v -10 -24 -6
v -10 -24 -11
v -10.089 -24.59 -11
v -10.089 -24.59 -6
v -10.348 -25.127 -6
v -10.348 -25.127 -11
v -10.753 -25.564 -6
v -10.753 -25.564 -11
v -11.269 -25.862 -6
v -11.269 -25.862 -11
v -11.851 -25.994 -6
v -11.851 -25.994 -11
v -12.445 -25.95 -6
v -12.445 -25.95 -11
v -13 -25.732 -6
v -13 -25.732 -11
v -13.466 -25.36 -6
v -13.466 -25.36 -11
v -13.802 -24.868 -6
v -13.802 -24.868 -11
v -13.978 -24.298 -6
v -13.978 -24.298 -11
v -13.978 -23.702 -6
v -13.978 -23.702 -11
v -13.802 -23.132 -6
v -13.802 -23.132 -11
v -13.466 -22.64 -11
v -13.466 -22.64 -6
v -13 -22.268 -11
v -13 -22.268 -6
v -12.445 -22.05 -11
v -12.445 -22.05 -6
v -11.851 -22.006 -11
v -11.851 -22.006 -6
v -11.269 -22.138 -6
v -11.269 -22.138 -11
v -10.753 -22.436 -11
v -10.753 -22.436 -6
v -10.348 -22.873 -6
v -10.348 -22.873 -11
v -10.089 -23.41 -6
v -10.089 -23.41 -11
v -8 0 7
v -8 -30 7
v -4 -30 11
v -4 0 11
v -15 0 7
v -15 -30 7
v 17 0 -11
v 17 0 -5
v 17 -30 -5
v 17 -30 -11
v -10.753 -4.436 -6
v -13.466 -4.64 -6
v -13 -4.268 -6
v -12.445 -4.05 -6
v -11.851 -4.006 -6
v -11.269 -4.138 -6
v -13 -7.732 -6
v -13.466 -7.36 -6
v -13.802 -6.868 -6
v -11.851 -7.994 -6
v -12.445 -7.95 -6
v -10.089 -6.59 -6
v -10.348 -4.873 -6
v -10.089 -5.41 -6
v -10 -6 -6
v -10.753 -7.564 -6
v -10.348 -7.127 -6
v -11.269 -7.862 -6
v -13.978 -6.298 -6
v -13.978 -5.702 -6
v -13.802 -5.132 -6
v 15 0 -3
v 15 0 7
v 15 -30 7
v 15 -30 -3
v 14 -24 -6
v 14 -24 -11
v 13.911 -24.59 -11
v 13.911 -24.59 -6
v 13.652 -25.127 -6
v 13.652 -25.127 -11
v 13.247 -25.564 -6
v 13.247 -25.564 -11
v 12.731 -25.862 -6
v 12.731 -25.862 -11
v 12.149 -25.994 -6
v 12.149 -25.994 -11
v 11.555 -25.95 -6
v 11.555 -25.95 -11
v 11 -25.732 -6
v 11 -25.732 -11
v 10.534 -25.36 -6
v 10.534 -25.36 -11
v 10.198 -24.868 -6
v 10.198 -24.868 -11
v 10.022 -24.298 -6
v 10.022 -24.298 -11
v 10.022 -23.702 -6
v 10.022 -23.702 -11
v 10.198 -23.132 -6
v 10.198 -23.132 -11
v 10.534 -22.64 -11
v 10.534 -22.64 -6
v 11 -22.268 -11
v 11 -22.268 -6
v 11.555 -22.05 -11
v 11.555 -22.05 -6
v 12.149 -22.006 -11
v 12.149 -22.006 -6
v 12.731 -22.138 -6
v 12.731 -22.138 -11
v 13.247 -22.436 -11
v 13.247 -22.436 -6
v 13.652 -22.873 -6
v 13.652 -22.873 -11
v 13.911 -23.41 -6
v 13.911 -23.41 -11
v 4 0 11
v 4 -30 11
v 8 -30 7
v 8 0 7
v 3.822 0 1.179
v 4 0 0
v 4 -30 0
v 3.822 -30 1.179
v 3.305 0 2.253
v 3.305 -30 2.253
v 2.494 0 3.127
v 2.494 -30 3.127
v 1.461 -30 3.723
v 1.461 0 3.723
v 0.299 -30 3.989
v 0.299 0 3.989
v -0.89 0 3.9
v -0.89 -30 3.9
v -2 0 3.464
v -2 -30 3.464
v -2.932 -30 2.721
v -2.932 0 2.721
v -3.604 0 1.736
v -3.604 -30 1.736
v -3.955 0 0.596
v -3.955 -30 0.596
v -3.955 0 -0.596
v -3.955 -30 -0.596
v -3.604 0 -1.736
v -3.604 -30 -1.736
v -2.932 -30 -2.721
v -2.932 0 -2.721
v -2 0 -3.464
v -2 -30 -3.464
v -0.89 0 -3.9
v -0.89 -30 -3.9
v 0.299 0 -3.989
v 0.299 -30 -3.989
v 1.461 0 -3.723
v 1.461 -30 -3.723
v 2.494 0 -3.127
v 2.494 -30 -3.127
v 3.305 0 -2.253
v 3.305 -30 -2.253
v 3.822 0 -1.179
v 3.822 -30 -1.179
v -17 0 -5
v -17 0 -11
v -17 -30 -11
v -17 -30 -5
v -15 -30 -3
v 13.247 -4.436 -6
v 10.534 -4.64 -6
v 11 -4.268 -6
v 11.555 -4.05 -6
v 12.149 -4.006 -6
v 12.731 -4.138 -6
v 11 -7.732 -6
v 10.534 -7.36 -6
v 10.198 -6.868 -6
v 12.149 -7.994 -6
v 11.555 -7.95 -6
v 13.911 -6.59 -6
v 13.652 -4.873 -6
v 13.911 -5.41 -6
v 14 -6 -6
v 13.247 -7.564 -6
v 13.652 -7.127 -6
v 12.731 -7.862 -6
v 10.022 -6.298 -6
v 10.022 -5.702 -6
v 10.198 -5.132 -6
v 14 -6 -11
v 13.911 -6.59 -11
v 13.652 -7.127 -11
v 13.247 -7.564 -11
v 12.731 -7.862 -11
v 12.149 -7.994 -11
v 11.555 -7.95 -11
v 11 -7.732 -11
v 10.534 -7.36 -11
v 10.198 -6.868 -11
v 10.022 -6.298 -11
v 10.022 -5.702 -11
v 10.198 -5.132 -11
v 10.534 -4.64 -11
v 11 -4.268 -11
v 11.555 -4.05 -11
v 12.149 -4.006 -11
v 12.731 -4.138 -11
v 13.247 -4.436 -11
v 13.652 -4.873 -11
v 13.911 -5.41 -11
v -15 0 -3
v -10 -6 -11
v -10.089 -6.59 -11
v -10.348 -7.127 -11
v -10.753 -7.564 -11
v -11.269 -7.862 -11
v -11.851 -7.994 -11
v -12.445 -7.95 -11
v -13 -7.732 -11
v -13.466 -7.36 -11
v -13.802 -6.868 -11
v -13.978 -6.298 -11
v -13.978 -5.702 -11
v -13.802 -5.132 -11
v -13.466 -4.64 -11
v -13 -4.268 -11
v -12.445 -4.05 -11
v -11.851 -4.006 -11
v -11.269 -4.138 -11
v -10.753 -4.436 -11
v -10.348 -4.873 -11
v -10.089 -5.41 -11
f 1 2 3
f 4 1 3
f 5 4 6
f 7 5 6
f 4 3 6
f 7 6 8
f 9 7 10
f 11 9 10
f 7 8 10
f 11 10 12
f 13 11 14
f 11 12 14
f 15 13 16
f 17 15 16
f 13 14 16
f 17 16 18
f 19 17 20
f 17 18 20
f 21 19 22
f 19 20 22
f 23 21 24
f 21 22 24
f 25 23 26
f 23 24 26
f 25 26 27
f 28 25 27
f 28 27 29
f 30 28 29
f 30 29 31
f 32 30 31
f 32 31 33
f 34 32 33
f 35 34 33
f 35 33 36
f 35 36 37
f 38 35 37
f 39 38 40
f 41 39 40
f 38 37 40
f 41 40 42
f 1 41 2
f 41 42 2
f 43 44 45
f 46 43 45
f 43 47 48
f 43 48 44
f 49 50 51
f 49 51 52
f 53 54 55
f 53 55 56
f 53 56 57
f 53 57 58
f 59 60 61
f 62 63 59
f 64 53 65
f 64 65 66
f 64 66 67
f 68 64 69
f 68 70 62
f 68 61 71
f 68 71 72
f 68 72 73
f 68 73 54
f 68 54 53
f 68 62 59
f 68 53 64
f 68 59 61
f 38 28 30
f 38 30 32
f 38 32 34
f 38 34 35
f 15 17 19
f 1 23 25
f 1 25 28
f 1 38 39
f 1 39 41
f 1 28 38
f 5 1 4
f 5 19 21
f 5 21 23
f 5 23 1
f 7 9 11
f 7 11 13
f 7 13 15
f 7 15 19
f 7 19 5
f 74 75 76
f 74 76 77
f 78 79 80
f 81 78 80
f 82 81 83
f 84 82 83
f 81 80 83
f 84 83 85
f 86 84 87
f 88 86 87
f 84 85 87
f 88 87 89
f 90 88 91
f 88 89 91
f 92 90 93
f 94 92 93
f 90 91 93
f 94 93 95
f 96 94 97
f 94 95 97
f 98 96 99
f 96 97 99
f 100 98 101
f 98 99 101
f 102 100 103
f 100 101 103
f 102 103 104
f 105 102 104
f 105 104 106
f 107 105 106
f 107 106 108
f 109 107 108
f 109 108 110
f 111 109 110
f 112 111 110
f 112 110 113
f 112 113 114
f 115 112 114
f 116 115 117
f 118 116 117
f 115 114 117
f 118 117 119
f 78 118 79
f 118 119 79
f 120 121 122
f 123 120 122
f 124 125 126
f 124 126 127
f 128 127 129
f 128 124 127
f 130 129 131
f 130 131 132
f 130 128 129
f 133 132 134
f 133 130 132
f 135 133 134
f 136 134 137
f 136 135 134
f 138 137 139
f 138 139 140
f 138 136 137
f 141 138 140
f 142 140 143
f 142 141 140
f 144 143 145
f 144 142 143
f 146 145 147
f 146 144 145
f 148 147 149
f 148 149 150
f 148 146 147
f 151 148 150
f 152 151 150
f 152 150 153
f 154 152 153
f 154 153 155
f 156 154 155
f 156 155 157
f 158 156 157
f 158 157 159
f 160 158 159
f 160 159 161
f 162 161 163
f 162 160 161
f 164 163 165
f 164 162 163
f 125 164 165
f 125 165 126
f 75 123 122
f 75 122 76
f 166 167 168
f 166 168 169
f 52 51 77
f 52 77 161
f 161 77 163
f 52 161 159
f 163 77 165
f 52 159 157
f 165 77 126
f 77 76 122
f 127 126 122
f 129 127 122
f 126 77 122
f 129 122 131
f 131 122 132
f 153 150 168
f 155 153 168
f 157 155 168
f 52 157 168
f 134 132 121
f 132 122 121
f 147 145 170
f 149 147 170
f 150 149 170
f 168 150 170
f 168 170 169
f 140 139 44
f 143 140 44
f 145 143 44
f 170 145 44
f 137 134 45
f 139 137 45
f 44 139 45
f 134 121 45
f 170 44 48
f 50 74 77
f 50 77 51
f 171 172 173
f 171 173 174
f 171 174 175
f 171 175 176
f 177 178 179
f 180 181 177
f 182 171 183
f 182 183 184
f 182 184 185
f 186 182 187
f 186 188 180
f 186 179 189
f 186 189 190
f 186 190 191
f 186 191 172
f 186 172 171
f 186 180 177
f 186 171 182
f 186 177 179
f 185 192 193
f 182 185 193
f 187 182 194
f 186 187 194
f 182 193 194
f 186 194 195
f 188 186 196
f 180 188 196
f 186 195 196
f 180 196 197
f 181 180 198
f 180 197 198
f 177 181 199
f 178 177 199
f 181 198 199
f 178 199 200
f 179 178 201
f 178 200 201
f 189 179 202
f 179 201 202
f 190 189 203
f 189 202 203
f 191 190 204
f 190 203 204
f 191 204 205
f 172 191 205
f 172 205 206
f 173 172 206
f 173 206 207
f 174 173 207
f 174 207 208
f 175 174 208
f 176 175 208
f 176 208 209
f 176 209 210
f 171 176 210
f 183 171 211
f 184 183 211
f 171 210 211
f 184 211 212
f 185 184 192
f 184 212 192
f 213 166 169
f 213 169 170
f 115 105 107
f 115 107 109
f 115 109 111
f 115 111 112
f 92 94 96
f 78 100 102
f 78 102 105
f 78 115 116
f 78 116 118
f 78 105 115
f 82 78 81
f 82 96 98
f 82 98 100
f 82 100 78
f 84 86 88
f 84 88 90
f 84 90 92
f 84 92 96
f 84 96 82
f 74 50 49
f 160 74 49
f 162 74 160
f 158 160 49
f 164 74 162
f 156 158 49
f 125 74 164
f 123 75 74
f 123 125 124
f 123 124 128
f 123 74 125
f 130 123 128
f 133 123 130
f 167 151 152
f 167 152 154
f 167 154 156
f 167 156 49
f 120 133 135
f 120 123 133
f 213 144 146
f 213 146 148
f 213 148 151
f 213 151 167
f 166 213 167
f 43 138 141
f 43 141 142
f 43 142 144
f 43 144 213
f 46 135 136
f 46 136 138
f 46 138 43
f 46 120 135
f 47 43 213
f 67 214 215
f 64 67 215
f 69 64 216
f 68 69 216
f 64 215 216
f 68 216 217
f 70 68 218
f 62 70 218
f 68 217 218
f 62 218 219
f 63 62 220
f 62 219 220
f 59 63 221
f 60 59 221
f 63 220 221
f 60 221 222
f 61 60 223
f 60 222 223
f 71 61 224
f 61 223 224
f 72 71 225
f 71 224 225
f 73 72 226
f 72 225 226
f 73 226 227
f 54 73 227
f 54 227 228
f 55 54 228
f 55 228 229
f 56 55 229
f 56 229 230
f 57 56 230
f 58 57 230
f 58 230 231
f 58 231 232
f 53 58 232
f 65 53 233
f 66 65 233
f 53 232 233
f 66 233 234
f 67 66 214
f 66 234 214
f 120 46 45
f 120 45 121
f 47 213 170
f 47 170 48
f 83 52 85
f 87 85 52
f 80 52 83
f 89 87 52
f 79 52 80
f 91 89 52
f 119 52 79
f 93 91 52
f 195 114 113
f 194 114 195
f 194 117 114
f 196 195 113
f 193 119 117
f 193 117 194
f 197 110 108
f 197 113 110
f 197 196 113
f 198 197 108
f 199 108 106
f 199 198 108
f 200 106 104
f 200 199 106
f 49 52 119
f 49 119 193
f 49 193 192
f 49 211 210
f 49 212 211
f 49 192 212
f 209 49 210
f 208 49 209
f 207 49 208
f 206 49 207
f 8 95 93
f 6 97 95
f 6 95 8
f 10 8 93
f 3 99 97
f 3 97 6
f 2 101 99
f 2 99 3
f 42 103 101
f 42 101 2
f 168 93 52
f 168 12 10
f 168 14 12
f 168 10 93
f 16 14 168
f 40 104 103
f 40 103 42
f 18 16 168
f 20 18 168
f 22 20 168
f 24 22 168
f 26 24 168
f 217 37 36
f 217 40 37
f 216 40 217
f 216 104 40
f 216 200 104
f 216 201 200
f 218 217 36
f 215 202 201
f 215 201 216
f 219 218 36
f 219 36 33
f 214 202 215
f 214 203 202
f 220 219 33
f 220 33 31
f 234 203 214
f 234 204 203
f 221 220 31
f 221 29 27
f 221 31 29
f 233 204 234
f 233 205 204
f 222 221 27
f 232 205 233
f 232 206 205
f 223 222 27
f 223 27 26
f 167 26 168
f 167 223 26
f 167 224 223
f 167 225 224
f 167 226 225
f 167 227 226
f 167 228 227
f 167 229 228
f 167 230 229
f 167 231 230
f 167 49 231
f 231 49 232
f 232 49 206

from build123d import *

# Parameters (mm, degrees)
SKETCH_R     = 4
PAD_DEPTH    = 30
SKETCH001_R  = 2
POCKET_DEPTH = 5


with BuildPart() as part:
    # Sketch → Pad (new body)
    with BuildSketch(Plane.XZ):
        Polygon((-17, -11), (-17, -5), (-15, -3), (-15, 7), (-8, 7), (-4, 11), (4, 11), (8, 7), (15, 7), (15, -3), (17, -5), (17, -11), align=None)
        Circle(SKETCH_R, mode=Mode.SUBTRACT)
    extrude(amount=PAD_DEPTH)

    # Sketch001 (on Face12 of Pad) → Pocket (cut)
    with BuildSketch(Plane(origin=(0, 0, -11), x_dir=(1, 0, 0), z_dir=(0, 0, -1))):
        with Locations((-12, 24)):
            Circle(SKETCH001_R)
        with Locations((12, 24)):
            Circle(SKETCH001_R)
        with Locations((-12, 6)):
            Circle(SKETCH001_R)
        with Locations((12, 6)):
            Circle(SKETCH001_R)
    extrude(amount=-POCKET_DEPTH, mode=Mode.SUBTRACT)


solid = part.part
